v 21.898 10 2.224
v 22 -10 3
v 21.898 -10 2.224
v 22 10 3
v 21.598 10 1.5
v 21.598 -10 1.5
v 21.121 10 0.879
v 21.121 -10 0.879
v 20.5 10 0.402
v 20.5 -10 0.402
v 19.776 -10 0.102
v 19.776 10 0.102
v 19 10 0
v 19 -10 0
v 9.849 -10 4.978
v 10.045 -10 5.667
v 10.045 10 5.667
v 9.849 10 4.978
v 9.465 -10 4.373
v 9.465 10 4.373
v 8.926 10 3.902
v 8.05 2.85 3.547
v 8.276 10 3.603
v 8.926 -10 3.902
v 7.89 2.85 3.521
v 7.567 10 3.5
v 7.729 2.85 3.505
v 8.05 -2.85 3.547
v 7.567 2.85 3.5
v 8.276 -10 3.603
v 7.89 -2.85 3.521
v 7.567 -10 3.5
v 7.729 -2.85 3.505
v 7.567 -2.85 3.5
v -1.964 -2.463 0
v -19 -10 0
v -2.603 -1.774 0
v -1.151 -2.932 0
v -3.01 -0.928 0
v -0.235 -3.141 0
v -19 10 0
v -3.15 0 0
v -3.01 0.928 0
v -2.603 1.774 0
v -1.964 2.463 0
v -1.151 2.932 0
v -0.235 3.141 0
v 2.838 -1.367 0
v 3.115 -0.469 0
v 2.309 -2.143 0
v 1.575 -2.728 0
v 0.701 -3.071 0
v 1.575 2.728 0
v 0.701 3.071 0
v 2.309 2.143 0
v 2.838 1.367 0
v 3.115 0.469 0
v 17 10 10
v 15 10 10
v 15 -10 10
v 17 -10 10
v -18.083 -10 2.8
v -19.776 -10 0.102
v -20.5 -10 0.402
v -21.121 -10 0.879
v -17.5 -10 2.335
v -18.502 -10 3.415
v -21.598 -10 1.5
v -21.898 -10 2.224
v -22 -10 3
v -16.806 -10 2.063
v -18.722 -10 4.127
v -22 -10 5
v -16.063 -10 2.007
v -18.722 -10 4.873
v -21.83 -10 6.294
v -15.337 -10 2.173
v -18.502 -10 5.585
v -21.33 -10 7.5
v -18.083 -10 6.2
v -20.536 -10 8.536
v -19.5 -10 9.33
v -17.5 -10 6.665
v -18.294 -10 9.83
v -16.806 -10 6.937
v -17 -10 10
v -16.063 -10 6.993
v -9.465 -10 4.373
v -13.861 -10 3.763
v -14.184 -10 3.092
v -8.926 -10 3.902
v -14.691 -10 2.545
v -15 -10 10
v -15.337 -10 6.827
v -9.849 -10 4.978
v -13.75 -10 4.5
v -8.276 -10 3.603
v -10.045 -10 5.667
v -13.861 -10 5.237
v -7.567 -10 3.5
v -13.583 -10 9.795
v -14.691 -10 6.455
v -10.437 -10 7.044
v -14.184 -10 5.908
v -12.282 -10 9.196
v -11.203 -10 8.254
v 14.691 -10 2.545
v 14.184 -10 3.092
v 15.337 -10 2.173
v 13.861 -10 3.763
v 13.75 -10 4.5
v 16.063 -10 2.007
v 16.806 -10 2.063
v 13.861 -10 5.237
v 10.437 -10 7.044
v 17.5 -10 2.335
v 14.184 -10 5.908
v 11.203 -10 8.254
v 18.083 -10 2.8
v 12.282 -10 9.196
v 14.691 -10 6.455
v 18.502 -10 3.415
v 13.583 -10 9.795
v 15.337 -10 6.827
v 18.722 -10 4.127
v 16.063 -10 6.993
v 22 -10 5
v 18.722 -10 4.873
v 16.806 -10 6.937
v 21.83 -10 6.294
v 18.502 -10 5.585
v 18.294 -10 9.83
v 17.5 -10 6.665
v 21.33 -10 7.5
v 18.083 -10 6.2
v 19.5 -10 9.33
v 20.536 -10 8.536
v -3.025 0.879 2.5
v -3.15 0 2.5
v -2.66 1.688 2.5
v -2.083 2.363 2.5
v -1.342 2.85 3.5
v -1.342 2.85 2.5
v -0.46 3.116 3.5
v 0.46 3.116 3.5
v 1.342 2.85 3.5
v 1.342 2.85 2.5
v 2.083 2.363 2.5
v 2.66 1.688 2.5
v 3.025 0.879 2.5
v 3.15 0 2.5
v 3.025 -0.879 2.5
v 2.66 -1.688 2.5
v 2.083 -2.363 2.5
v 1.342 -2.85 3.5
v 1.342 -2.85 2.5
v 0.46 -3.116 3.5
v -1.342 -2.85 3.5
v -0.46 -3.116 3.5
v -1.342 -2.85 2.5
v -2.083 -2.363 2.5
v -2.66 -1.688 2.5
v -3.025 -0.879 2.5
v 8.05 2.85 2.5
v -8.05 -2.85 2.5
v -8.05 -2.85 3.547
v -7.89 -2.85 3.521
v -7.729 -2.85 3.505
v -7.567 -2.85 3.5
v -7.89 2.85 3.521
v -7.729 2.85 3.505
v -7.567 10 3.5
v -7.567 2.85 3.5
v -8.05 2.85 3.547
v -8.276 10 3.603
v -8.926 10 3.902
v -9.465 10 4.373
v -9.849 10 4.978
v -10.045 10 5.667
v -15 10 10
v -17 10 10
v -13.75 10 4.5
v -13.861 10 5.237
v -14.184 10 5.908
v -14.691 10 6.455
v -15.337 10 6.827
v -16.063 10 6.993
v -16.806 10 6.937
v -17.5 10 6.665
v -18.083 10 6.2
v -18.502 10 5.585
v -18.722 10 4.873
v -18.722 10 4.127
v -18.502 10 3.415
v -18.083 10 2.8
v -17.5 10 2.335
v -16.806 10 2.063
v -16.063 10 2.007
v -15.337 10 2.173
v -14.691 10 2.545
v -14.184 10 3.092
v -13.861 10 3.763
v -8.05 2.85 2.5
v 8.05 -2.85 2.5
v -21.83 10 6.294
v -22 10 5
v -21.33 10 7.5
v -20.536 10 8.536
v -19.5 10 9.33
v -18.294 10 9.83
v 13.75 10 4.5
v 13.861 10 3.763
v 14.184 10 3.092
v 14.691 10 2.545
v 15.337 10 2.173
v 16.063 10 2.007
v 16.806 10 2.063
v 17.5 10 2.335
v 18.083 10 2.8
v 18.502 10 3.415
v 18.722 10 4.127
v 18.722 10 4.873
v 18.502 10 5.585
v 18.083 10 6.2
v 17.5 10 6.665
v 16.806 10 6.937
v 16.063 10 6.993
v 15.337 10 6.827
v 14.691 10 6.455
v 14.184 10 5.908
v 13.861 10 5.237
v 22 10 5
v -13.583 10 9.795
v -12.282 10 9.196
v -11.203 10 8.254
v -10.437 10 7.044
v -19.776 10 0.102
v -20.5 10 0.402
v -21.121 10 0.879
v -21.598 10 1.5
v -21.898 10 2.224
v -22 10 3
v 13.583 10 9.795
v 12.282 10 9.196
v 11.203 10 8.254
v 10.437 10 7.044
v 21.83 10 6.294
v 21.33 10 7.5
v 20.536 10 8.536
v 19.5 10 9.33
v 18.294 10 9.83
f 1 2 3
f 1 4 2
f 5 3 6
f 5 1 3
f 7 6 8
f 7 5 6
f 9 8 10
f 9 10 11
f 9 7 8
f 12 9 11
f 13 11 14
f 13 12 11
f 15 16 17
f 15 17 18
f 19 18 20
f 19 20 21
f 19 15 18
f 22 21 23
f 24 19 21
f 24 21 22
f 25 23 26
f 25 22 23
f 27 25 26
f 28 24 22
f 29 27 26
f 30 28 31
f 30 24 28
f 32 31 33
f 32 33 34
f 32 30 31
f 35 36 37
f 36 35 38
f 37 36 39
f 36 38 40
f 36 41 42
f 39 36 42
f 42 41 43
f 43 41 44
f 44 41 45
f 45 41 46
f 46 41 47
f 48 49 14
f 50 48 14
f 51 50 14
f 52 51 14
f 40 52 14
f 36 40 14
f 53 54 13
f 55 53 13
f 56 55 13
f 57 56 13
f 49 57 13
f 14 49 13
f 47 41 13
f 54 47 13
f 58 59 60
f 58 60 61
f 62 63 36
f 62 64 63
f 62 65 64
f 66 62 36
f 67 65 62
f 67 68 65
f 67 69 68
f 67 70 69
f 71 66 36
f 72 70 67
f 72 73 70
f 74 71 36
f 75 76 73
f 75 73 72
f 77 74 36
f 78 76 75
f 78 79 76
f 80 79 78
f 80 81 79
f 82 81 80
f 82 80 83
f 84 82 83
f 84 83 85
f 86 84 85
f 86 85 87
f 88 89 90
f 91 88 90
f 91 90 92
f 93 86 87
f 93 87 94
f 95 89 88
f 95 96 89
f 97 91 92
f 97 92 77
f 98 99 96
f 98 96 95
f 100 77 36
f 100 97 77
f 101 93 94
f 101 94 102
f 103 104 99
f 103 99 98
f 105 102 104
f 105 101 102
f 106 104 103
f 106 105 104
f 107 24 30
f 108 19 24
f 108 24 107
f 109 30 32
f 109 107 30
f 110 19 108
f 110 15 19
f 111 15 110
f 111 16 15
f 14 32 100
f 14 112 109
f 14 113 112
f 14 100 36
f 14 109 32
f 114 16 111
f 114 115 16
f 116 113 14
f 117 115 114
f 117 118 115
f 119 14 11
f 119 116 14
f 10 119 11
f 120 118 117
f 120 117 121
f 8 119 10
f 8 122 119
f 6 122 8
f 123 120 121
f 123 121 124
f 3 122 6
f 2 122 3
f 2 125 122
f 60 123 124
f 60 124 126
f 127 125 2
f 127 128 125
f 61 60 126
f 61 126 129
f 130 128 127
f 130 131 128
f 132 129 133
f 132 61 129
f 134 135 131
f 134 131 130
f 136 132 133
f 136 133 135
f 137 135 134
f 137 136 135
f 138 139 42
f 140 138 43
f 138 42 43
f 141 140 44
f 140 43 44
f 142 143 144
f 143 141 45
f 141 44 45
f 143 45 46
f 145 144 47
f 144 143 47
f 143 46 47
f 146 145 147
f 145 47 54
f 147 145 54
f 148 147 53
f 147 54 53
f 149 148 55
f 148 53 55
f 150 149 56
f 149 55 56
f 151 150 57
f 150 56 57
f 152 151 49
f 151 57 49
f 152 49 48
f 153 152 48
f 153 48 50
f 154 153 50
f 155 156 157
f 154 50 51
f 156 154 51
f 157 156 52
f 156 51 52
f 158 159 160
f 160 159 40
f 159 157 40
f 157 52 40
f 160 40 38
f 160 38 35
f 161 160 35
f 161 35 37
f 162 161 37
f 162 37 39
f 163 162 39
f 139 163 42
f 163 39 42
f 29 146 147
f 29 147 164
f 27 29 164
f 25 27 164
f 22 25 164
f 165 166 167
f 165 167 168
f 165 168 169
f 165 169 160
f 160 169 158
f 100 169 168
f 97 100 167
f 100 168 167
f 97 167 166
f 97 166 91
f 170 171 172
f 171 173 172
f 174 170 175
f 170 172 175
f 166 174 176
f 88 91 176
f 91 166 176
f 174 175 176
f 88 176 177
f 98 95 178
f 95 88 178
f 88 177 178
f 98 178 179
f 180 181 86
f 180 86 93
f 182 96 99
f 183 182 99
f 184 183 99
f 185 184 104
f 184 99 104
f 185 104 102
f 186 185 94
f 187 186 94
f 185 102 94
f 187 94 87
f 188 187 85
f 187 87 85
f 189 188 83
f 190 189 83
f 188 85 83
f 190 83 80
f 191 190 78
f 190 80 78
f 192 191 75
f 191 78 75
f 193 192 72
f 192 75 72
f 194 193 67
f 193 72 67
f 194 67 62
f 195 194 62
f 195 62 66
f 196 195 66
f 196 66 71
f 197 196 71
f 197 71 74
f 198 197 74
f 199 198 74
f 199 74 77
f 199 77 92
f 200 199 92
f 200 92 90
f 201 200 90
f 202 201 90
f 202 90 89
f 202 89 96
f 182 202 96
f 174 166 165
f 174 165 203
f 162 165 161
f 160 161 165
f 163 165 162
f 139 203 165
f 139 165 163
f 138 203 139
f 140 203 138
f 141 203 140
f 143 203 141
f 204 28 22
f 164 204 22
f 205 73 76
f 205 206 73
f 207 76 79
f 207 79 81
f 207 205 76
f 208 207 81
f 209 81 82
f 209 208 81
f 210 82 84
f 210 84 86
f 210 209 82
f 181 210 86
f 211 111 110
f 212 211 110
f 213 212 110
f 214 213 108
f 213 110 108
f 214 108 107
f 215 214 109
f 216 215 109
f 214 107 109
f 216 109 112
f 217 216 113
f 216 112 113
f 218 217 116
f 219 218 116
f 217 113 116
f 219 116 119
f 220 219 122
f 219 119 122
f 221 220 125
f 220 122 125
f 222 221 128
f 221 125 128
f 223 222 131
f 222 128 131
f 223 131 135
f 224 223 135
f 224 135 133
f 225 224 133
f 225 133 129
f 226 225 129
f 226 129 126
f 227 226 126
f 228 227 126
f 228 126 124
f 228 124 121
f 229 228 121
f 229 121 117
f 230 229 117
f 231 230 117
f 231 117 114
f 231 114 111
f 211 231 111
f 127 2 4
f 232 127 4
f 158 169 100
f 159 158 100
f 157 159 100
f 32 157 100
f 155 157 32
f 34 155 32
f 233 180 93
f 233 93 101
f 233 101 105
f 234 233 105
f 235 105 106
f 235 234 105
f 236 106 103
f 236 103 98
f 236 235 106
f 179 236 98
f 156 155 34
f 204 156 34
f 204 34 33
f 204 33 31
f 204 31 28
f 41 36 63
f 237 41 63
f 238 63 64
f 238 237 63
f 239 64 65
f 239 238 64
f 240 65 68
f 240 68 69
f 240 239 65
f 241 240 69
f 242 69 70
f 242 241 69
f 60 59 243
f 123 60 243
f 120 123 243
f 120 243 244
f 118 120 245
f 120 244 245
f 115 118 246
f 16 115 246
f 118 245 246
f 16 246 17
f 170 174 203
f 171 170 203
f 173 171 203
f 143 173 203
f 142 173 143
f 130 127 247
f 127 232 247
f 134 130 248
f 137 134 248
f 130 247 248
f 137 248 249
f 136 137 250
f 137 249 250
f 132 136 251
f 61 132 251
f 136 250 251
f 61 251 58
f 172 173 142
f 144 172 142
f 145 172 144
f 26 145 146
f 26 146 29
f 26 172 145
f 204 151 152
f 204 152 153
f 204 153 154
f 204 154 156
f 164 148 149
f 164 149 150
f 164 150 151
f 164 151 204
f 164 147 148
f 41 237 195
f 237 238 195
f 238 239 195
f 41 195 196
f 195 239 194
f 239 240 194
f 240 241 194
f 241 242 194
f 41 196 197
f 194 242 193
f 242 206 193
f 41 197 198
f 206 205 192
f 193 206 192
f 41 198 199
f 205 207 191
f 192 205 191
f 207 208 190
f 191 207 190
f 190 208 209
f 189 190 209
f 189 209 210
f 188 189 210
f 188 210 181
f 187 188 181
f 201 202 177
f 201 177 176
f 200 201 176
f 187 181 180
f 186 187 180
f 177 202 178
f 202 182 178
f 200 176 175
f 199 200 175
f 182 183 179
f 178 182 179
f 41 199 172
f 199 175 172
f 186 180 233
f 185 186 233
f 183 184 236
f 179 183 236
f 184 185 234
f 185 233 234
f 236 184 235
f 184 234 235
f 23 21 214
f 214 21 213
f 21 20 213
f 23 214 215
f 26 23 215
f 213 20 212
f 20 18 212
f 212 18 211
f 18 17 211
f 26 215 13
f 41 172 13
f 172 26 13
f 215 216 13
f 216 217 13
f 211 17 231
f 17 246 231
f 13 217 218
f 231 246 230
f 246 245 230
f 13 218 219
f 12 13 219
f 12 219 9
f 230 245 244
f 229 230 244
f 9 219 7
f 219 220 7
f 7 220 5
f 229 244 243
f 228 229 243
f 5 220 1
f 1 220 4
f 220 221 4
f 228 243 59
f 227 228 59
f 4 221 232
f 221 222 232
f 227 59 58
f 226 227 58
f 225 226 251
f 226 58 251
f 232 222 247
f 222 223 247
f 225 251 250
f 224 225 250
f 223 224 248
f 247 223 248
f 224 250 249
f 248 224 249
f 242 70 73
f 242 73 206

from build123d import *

# Parameters (mm, degrees)
F0_W          = 36
F0_H          = 20
F1_DEPTH      = 3.5
F3_DEPTH      = 1
F4_W          = 4
F4_H          = 20
F4_W_2        = 8
F5_DEPTH      = 10
F6_R          = 2.5
F7_DEPTH      = 20.001
F8_R          = 5
F9_R          = 3
F10_T4_DEPTH  = 20
F10_T10_DEPTH = 20
F10_T16_DEPTH = 20
F10_T23_DEPTH = 20
F10_T29_DEPTH = 20
F10_T35_DEPTH = 20
F10_T41_DEPTH = 20
F10_T47_DEPTH = 20
F10_T54_DEPTH = 20
F10_T60_DEPTH = 20


# Not quite as in the source:
# - a fillet or chamfer that OpenCascade refuses, or shapes differently, is made with other operations: its cross-section is extruded or revolved along the edge and cut away or added


with BuildPart() as f1:
    # F0 (on Top) → F1 (new body)
    with BuildSketch(Plane.XY):
        Rectangle(F0_W, F0_H)
        with BuildLine():
            ThreePointArc((3.15, 0), (0, -3.15), (-3.15, 0))
            ThreePointArc((-3.15, 0), (0, 3.15), (3.15, 0))
        make_face(mode=Mode.SUBTRACT)
    extrude(amount=F1_DEPTH)

    # F2 (on face) → F3 (cut)
    with BuildSketch(Plane.XY.offset(3.5)):
        with BuildLine():
            Line((-1.3416407865, 2.85), (-8.05, 2.85))
            Line((-8.05, 2.85), (-8.05, -2.85))
            Line((-8.05, -2.85), (-1.3416407865, -2.85))
            ThreePointArc((-1.3416407865, -2.85), (-3.15, 0), (-1.3416407865, 2.85))
        make_face()
        with BuildLine():
            Line((1.3416407865, 2.85), (-1.3416407865, 2.85))
            ThreePointArc((-1.3416407865, 2.85), (-3.15, 0), (-1.3416407865, -2.85))
            Line((-1.3416407865, -2.85), (1.3416407865, -2.85))
            ThreePointArc((1.3416407865, -2.85), (2.6597620643, -1.6876509595), (3.15, 0))
            ThreePointArc((3.15, 0), (2.6597620643, 1.6876509595), (1.3416407865, 2.85))
        make_face()
        with BuildLine():
            Line((8.05, 2.85), (1.3416407865, 2.85))
            ThreePointArc((1.3416407865, 2.85), (2.6597620643, 1.6876509595), (3.15, 0))
            ThreePointArc((3.15, 0), (2.6597620643, -1.6876509595), (1.3416407865, -2.85))
            Line((1.3416407865, -2.85), (8.05, -2.85))
            Line((8.05, -2.85), (8.05, 2.85))
        make_face()
    extrude(amount=-F3_DEPTH, mode=Mode.SUBTRACT)

    # F4 (on Top) → F5 (join)
    with BuildSketch(Plane.XY):
        with Locations((20, 0)):
            Rectangle(F4_W, F4_H)
        with Locations((14, 0)):
            Rectangle(F4_W_2, F4_H)
        with Locations((-14, 0)):
            Rectangle(F4_W_2, F4_H)
        with Locations((-20, 0)):
            Rectangle(F4_W, F4_H)
    extrude(amount=F5_DEPTH)

    # F6 (on face) → F7 (cut, through all)
    with BuildSketch(Plane.XZ.offset(10)):
        with Locations((-16.25, 4.5)):
            Circle(F6_R)
        with BuildLine():
            ThreePointArc((18.75, 4.5), (16.25, 7), (13.75, 4.5))
            ThreePointArc((13.75, 4.5), (16.25, 2), (18.75, 4.5))
        make_face()
    extrude(amount=-F7_DEPTH, mode=Mode.SUBTRACT)

    # F8
    f8_edges = [f1.edges().sort_by_distance(p)[0] for p in [
        (-22, 0, 10),
        (-10, 0, 10),
        (10, 0, 10),
        (22, 0, 10),
    ]]
    fillet(f8_edges, radius=F8_R)

    # F9
    f9_edges = [f1.edges().sort_by_distance(p)[0] for p in [
        (-22, 0, 0),
        (22, 0, 0),
    ]]
    fillet(f9_edges, radius=F9_R)

    # F10: fillet of radius 2.5 on 2 edges, made by hand


with BuildPart() as f10_tool2:
    # F10_s3 → F10_t4 (new body)
    with BuildSketch(Plane.XZ.offset(10)):
        with BuildLine():
            ThreePointArc((10.0446437509, 5.6666666667), (9.2126670979, 4.1180683682), (7.5669656263, 3.5))
            Line((7.5669656263, 3.5), (7.5669656263, 3.25))
            Line((7.5669656263, 3.25), (10, 3.25))
            Line((10, 3.25), (10.25, 3.5))
            ThreePointArc((10.25, 3.5), (10.25, 5), (10.2924115633, 5.6333333333))
            Line((10.2924115633, 5.6333333333), (10.0446437509, 5.6666666667))
        make_face()
    extrude(amount=-F10_T4_DEPTH)

    split(bisect_by=Plane.YZ.offset(8.05), keep=Keep.TOP)

    split(bisect_by=Plane.XZ.offset(2.85), keep=Keep.TOP)


with BuildPart() as f1_1:
    add(f1.part)

    # F10_t1: union F10_tool2
    add(f10_tool2.part)


with BuildPart() as f10_tool8:
    # F10_s9 → F10_t10 (new body)
    with BuildSketch(Plane.XZ.offset(10)):
        with BuildLine():
            ThreePointArc((10.0446437509, 5.6666666667), (9.2126670979, 4.1180683682), (7.5669656263, 3.5))
            Line((7.5669656263, 3.5), (7.5669656263, 3.25))
            Line((7.5669656263, 3.25), (10, 3.25))
            Line((10, 3.25), (10.25, 3.5))
            ThreePointArc((10.25, 3.5), (10.25, 5), (10.2924115633, 5.6333333333))
            Line((10.2924115633, 5.6333333333), (10.0446437509, 5.6666666667))
        make_face()
    extrude(amount=-F10_T10_DEPTH)

    split(bisect_by=Plane.YZ.offset(8.05), keep=Keep.BOTTOM)

    split(bisect_by=Plane.XZ.offset(2.85), keep=Keep.TOP)


with BuildPart() as f1_2:
    add(f1_1.part)

    # F10_t7: union F10_tool8
    add(f10_tool8.part)


with BuildPart() as f10_tool14:
    # F10_s15 → F10_t16 (new body)
    with BuildSketch(Plane.XZ.offset(10)):
        with BuildLine():
            ThreePointArc((10.0446437509, 5.6666666667), (9.2126670979, 4.1180683682), (7.5669656263, 3.5))
            Line((7.5669656263, 3.5), (7.5669656263, 3.25))
            Line((7.5669656263, 3.25), (10, 3.25))
            Line((10, 3.25), (10.25, 3.5))
            ThreePointArc((10.25, 3.5), (10.25, 5), (10.2924115633, 5.6333333333))
            Line((10.2924115633, 5.6333333333), (10.0446437509, 5.6666666667))
        make_face()
    extrude(amount=-F10_T16_DEPTH)

    split(bisect_by=Plane.XZ.offset(-2.85), keep=Keep.TOP)

    split(bisect_by=Plane.YZ.offset(8.05), keep=Keep.TOP)

    split(bisect_by=Plane.XZ.offset(2.85), keep=Keep.BOTTOM)


with BuildPart() as f1_3:
    add(f1_2.part)

    # F10_t13: union F10_tool14
    add(f10_tool14.part)


with BuildPart() as f10_tool21:
    # F10_s22 → F10_t23 (new body)
    with BuildSketch(Plane.XZ.offset(10)):
        with BuildLine():
            ThreePointArc((10.0446437509, 5.6666666667), (9.2126670979, 4.1180683682), (7.5669656263, 3.5))
            Line((7.5669656263, 3.5), (7.5669656263, 3.25))
            Line((7.5669656263, 3.25), (10, 3.25))
            Line((10, 3.25), (10.25, 3.5))
            ThreePointArc((10.25, 3.5), (10.25, 5), (10.2924115633, 5.6333333333))
            Line((10.2924115633, 5.6333333333), (10.0446437509, 5.6666666667))
        make_face()
    extrude(amount=-F10_T23_DEPTH)

    split(bisect_by=Plane.XZ.offset(-2.85), keep=Keep.BOTTOM)

    split(bisect_by=Plane.YZ.offset(8.05), keep=Keep.TOP)


with BuildPart() as f1_4:
    add(f1_3.part)

    # F10_t20: union F10_tool21
    add(f10_tool21.part)


with BuildPart() as f10_tool27:
    # F10_s28 → F10_t29 (new body)
    with BuildSketch(Plane.XZ.offset(10)):
        with BuildLine():
            ThreePointArc((10.0446437509, 5.6666666667), (9.2126670979, 4.1180683682), (7.5669656263, 3.5))
            Line((7.5669656263, 3.5), (7.5669656263, 3.25))
            Line((7.5669656263, 3.25), (10, 3.25))
            Line((10, 3.25), (10.25, 3.5))
            ThreePointArc((10.25, 3.5), (10.25, 5), (10.2924115633, 5.6333333333))
            Line((10.2924115633, 5.6333333333), (10.0446437509, 5.6666666667))
        make_face()
    extrude(amount=-F10_T29_DEPTH)

    split(bisect_by=Plane.XZ.offset(-2.85), keep=Keep.BOTTOM)

    split(bisect_by=Plane.YZ.offset(8.05), keep=Keep.BOTTOM)


with BuildPart() as f1_5:
    add(f1_4.part)

    # F10_t26: union F10_tool27
    add(f10_tool27.part)


with BuildPart() as f10_tool33:
    # F10_s34 → F10_t35 (new body)
    with BuildSketch(Plane.XZ.offset(-10)):
        with BuildLine():
            ThreePointArc((-7.5669656263, 3.5), (-9.2126670979, 4.1180683682), (-10.0446437509, 5.6666666667))
            Line((-10.0446437509, 5.6666666667), (-10.2924115633, 5.6333333333))
            ThreePointArc((-10.2924115633, 5.6333333333), (-10.25, 5), (-10.25, 3.5))
            Line((-10.25, 3.5), (-10, 3.25))
            Line((-10, 3.25), (-7.5669656263, 3.25))
            Line((-7.5669656263, 3.25), (-7.5669656263, 3.5))
        make_face()
    extrude(amount=F10_T35_DEPTH)

    split(bisect_by=Plane.XZ.offset(-2.85), keep=Keep.BOTTOM)

    split(bisect_by=Plane.YZ.offset(-8.05), keep=Keep.TOP)


with BuildPart() as f1_6:
    add(f1_5.part)

    # F10_t32: union F10_tool33
    add(f10_tool33.part)


with BuildPart() as f10_tool39:
    # F10_s40 → F10_t41 (new body)
    with BuildSketch(Plane.XZ.offset(-10)):
        with BuildLine():
            ThreePointArc((-7.5669656263, 3.5), (-9.2126670979, 4.1180683682), (-10.0446437509, 5.6666666667))
            Line((-10.0446437509, 5.6666666667), (-10.2924115633, 5.6333333333))
            ThreePointArc((-10.2924115633, 5.6333333333), (-10.25, 5), (-10.25, 3.5))
            Line((-10.25, 3.5), (-10, 3.25))
            Line((-10, 3.25), (-7.5669656263, 3.25))
            Line((-7.5669656263, 3.25), (-7.5669656263, 3.5))
        make_face()
    extrude(amount=F10_T41_DEPTH)

    split(bisect_by=Plane.XZ.offset(-2.85), keep=Keep.BOTTOM)

    split(bisect_by=Plane.YZ.offset(-8.05), keep=Keep.BOTTOM)


with BuildPart() as f1_7:
    add(f1_6.part)

    # F10_t38: union F10_tool39
    add(f10_tool39.part)


with BuildPart() as f10_tool45:
    # F10_s46 → F10_t47 (new body)
    with BuildSketch(Plane.XZ.offset(-10)):
        with BuildLine():
            ThreePointArc((-7.5669656263, 3.5), (-9.2126670979, 4.1180683682), (-10.0446437509, 5.6666666667))
            Line((-10.0446437509, 5.6666666667), (-10.2924115633, 5.6333333333))
            ThreePointArc((-10.2924115633, 5.6333333333), (-10.25, 5), (-10.25, 3.5))
            Line((-10.25, 3.5), (-10, 3.25))
            Line((-10, 3.25), (-7.5669656263, 3.25))
            Line((-7.5669656263, 3.25), (-7.5669656263, 3.5))
        make_face()
    extrude(amount=F10_T47_DEPTH)

    split(bisect_by=Plane.XZ.offset(-2.85), keep=Keep.TOP)

    split(bisect_by=Plane.YZ.offset(-8.05), keep=Keep.BOTTOM)

    split(bisect_by=Plane.XZ.offset(2.85), keep=Keep.BOTTOM)


with BuildPart() as f1_8:
    add(f1_7.part)

    # F10_t44: union F10_tool45
    add(f10_tool45.part)


with BuildPart() as f10_tool52:
    # F10_s53 → F10_t54 (new body)
    with BuildSketch(Plane.XZ.offset(-10)):
        with BuildLine():
            ThreePointArc((-7.5669656263, 3.5), (-9.2126670979, 4.1180683682), (-10.0446437509, 5.6666666667))
            Line((-10.0446437509, 5.6666666667), (-10.2924115633, 5.6333333333))
            ThreePointArc((-10.2924115633, 5.6333333333), (-10.25, 5), (-10.25, 3.5))
            Line((-10.25, 3.5), (-10, 3.25))
            Line((-10, 3.25), (-7.5669656263, 3.25))
            Line((-7.5669656263, 3.25), (-7.5669656263, 3.5))
        make_face()
    extrude(amount=F10_T54_DEPTH)

    split(bisect_by=Plane.YZ.offset(-8.05), keep=Keep.TOP)

    split(bisect_by=Plane.XZ.offset(2.85), keep=Keep.TOP)


with BuildPart() as f1_9:
    add(f1_8.part)

    # F10_t51: union F10_tool52
    add(f10_tool52.part)


with BuildPart() as f10_tool58:
    # F10_s59 → F10_t60 (new body)
    with BuildSketch(Plane.XZ.offset(-10)):
        with BuildLine():
            ThreePointArc((-7.5669656263, 3.5), (-9.2126670979, 4.1180683682), (-10.0446437509, 5.6666666667))
            Line((-10.0446437509, 5.6666666667), (-10.2924115633, 5.6333333333))
            ThreePointArc((-10.2924115633, 5.6333333333), (-10.25, 5), (-10.25, 3.5))
            Line((-10.25, 3.5), (-10, 3.25))
            Line((-10, 3.25), (-7.5669656263, 3.25))
            Line((-7.5669656263, 3.25), (-7.5669656263, 3.5))
        make_face()
    extrude(amount=F10_T60_DEPTH)

    split(bisect_by=Plane.YZ.offset(-8.05), keep=Keep.BOTTOM)

    split(bisect_by=Plane.XZ.offset(2.85), keep=Keep.TOP)


with BuildPart() as f1_10:
    add(f1_9.part)

    # F10_t57: union F10_tool58
    add(f10_tool58.part)


solid = f1_10.part
